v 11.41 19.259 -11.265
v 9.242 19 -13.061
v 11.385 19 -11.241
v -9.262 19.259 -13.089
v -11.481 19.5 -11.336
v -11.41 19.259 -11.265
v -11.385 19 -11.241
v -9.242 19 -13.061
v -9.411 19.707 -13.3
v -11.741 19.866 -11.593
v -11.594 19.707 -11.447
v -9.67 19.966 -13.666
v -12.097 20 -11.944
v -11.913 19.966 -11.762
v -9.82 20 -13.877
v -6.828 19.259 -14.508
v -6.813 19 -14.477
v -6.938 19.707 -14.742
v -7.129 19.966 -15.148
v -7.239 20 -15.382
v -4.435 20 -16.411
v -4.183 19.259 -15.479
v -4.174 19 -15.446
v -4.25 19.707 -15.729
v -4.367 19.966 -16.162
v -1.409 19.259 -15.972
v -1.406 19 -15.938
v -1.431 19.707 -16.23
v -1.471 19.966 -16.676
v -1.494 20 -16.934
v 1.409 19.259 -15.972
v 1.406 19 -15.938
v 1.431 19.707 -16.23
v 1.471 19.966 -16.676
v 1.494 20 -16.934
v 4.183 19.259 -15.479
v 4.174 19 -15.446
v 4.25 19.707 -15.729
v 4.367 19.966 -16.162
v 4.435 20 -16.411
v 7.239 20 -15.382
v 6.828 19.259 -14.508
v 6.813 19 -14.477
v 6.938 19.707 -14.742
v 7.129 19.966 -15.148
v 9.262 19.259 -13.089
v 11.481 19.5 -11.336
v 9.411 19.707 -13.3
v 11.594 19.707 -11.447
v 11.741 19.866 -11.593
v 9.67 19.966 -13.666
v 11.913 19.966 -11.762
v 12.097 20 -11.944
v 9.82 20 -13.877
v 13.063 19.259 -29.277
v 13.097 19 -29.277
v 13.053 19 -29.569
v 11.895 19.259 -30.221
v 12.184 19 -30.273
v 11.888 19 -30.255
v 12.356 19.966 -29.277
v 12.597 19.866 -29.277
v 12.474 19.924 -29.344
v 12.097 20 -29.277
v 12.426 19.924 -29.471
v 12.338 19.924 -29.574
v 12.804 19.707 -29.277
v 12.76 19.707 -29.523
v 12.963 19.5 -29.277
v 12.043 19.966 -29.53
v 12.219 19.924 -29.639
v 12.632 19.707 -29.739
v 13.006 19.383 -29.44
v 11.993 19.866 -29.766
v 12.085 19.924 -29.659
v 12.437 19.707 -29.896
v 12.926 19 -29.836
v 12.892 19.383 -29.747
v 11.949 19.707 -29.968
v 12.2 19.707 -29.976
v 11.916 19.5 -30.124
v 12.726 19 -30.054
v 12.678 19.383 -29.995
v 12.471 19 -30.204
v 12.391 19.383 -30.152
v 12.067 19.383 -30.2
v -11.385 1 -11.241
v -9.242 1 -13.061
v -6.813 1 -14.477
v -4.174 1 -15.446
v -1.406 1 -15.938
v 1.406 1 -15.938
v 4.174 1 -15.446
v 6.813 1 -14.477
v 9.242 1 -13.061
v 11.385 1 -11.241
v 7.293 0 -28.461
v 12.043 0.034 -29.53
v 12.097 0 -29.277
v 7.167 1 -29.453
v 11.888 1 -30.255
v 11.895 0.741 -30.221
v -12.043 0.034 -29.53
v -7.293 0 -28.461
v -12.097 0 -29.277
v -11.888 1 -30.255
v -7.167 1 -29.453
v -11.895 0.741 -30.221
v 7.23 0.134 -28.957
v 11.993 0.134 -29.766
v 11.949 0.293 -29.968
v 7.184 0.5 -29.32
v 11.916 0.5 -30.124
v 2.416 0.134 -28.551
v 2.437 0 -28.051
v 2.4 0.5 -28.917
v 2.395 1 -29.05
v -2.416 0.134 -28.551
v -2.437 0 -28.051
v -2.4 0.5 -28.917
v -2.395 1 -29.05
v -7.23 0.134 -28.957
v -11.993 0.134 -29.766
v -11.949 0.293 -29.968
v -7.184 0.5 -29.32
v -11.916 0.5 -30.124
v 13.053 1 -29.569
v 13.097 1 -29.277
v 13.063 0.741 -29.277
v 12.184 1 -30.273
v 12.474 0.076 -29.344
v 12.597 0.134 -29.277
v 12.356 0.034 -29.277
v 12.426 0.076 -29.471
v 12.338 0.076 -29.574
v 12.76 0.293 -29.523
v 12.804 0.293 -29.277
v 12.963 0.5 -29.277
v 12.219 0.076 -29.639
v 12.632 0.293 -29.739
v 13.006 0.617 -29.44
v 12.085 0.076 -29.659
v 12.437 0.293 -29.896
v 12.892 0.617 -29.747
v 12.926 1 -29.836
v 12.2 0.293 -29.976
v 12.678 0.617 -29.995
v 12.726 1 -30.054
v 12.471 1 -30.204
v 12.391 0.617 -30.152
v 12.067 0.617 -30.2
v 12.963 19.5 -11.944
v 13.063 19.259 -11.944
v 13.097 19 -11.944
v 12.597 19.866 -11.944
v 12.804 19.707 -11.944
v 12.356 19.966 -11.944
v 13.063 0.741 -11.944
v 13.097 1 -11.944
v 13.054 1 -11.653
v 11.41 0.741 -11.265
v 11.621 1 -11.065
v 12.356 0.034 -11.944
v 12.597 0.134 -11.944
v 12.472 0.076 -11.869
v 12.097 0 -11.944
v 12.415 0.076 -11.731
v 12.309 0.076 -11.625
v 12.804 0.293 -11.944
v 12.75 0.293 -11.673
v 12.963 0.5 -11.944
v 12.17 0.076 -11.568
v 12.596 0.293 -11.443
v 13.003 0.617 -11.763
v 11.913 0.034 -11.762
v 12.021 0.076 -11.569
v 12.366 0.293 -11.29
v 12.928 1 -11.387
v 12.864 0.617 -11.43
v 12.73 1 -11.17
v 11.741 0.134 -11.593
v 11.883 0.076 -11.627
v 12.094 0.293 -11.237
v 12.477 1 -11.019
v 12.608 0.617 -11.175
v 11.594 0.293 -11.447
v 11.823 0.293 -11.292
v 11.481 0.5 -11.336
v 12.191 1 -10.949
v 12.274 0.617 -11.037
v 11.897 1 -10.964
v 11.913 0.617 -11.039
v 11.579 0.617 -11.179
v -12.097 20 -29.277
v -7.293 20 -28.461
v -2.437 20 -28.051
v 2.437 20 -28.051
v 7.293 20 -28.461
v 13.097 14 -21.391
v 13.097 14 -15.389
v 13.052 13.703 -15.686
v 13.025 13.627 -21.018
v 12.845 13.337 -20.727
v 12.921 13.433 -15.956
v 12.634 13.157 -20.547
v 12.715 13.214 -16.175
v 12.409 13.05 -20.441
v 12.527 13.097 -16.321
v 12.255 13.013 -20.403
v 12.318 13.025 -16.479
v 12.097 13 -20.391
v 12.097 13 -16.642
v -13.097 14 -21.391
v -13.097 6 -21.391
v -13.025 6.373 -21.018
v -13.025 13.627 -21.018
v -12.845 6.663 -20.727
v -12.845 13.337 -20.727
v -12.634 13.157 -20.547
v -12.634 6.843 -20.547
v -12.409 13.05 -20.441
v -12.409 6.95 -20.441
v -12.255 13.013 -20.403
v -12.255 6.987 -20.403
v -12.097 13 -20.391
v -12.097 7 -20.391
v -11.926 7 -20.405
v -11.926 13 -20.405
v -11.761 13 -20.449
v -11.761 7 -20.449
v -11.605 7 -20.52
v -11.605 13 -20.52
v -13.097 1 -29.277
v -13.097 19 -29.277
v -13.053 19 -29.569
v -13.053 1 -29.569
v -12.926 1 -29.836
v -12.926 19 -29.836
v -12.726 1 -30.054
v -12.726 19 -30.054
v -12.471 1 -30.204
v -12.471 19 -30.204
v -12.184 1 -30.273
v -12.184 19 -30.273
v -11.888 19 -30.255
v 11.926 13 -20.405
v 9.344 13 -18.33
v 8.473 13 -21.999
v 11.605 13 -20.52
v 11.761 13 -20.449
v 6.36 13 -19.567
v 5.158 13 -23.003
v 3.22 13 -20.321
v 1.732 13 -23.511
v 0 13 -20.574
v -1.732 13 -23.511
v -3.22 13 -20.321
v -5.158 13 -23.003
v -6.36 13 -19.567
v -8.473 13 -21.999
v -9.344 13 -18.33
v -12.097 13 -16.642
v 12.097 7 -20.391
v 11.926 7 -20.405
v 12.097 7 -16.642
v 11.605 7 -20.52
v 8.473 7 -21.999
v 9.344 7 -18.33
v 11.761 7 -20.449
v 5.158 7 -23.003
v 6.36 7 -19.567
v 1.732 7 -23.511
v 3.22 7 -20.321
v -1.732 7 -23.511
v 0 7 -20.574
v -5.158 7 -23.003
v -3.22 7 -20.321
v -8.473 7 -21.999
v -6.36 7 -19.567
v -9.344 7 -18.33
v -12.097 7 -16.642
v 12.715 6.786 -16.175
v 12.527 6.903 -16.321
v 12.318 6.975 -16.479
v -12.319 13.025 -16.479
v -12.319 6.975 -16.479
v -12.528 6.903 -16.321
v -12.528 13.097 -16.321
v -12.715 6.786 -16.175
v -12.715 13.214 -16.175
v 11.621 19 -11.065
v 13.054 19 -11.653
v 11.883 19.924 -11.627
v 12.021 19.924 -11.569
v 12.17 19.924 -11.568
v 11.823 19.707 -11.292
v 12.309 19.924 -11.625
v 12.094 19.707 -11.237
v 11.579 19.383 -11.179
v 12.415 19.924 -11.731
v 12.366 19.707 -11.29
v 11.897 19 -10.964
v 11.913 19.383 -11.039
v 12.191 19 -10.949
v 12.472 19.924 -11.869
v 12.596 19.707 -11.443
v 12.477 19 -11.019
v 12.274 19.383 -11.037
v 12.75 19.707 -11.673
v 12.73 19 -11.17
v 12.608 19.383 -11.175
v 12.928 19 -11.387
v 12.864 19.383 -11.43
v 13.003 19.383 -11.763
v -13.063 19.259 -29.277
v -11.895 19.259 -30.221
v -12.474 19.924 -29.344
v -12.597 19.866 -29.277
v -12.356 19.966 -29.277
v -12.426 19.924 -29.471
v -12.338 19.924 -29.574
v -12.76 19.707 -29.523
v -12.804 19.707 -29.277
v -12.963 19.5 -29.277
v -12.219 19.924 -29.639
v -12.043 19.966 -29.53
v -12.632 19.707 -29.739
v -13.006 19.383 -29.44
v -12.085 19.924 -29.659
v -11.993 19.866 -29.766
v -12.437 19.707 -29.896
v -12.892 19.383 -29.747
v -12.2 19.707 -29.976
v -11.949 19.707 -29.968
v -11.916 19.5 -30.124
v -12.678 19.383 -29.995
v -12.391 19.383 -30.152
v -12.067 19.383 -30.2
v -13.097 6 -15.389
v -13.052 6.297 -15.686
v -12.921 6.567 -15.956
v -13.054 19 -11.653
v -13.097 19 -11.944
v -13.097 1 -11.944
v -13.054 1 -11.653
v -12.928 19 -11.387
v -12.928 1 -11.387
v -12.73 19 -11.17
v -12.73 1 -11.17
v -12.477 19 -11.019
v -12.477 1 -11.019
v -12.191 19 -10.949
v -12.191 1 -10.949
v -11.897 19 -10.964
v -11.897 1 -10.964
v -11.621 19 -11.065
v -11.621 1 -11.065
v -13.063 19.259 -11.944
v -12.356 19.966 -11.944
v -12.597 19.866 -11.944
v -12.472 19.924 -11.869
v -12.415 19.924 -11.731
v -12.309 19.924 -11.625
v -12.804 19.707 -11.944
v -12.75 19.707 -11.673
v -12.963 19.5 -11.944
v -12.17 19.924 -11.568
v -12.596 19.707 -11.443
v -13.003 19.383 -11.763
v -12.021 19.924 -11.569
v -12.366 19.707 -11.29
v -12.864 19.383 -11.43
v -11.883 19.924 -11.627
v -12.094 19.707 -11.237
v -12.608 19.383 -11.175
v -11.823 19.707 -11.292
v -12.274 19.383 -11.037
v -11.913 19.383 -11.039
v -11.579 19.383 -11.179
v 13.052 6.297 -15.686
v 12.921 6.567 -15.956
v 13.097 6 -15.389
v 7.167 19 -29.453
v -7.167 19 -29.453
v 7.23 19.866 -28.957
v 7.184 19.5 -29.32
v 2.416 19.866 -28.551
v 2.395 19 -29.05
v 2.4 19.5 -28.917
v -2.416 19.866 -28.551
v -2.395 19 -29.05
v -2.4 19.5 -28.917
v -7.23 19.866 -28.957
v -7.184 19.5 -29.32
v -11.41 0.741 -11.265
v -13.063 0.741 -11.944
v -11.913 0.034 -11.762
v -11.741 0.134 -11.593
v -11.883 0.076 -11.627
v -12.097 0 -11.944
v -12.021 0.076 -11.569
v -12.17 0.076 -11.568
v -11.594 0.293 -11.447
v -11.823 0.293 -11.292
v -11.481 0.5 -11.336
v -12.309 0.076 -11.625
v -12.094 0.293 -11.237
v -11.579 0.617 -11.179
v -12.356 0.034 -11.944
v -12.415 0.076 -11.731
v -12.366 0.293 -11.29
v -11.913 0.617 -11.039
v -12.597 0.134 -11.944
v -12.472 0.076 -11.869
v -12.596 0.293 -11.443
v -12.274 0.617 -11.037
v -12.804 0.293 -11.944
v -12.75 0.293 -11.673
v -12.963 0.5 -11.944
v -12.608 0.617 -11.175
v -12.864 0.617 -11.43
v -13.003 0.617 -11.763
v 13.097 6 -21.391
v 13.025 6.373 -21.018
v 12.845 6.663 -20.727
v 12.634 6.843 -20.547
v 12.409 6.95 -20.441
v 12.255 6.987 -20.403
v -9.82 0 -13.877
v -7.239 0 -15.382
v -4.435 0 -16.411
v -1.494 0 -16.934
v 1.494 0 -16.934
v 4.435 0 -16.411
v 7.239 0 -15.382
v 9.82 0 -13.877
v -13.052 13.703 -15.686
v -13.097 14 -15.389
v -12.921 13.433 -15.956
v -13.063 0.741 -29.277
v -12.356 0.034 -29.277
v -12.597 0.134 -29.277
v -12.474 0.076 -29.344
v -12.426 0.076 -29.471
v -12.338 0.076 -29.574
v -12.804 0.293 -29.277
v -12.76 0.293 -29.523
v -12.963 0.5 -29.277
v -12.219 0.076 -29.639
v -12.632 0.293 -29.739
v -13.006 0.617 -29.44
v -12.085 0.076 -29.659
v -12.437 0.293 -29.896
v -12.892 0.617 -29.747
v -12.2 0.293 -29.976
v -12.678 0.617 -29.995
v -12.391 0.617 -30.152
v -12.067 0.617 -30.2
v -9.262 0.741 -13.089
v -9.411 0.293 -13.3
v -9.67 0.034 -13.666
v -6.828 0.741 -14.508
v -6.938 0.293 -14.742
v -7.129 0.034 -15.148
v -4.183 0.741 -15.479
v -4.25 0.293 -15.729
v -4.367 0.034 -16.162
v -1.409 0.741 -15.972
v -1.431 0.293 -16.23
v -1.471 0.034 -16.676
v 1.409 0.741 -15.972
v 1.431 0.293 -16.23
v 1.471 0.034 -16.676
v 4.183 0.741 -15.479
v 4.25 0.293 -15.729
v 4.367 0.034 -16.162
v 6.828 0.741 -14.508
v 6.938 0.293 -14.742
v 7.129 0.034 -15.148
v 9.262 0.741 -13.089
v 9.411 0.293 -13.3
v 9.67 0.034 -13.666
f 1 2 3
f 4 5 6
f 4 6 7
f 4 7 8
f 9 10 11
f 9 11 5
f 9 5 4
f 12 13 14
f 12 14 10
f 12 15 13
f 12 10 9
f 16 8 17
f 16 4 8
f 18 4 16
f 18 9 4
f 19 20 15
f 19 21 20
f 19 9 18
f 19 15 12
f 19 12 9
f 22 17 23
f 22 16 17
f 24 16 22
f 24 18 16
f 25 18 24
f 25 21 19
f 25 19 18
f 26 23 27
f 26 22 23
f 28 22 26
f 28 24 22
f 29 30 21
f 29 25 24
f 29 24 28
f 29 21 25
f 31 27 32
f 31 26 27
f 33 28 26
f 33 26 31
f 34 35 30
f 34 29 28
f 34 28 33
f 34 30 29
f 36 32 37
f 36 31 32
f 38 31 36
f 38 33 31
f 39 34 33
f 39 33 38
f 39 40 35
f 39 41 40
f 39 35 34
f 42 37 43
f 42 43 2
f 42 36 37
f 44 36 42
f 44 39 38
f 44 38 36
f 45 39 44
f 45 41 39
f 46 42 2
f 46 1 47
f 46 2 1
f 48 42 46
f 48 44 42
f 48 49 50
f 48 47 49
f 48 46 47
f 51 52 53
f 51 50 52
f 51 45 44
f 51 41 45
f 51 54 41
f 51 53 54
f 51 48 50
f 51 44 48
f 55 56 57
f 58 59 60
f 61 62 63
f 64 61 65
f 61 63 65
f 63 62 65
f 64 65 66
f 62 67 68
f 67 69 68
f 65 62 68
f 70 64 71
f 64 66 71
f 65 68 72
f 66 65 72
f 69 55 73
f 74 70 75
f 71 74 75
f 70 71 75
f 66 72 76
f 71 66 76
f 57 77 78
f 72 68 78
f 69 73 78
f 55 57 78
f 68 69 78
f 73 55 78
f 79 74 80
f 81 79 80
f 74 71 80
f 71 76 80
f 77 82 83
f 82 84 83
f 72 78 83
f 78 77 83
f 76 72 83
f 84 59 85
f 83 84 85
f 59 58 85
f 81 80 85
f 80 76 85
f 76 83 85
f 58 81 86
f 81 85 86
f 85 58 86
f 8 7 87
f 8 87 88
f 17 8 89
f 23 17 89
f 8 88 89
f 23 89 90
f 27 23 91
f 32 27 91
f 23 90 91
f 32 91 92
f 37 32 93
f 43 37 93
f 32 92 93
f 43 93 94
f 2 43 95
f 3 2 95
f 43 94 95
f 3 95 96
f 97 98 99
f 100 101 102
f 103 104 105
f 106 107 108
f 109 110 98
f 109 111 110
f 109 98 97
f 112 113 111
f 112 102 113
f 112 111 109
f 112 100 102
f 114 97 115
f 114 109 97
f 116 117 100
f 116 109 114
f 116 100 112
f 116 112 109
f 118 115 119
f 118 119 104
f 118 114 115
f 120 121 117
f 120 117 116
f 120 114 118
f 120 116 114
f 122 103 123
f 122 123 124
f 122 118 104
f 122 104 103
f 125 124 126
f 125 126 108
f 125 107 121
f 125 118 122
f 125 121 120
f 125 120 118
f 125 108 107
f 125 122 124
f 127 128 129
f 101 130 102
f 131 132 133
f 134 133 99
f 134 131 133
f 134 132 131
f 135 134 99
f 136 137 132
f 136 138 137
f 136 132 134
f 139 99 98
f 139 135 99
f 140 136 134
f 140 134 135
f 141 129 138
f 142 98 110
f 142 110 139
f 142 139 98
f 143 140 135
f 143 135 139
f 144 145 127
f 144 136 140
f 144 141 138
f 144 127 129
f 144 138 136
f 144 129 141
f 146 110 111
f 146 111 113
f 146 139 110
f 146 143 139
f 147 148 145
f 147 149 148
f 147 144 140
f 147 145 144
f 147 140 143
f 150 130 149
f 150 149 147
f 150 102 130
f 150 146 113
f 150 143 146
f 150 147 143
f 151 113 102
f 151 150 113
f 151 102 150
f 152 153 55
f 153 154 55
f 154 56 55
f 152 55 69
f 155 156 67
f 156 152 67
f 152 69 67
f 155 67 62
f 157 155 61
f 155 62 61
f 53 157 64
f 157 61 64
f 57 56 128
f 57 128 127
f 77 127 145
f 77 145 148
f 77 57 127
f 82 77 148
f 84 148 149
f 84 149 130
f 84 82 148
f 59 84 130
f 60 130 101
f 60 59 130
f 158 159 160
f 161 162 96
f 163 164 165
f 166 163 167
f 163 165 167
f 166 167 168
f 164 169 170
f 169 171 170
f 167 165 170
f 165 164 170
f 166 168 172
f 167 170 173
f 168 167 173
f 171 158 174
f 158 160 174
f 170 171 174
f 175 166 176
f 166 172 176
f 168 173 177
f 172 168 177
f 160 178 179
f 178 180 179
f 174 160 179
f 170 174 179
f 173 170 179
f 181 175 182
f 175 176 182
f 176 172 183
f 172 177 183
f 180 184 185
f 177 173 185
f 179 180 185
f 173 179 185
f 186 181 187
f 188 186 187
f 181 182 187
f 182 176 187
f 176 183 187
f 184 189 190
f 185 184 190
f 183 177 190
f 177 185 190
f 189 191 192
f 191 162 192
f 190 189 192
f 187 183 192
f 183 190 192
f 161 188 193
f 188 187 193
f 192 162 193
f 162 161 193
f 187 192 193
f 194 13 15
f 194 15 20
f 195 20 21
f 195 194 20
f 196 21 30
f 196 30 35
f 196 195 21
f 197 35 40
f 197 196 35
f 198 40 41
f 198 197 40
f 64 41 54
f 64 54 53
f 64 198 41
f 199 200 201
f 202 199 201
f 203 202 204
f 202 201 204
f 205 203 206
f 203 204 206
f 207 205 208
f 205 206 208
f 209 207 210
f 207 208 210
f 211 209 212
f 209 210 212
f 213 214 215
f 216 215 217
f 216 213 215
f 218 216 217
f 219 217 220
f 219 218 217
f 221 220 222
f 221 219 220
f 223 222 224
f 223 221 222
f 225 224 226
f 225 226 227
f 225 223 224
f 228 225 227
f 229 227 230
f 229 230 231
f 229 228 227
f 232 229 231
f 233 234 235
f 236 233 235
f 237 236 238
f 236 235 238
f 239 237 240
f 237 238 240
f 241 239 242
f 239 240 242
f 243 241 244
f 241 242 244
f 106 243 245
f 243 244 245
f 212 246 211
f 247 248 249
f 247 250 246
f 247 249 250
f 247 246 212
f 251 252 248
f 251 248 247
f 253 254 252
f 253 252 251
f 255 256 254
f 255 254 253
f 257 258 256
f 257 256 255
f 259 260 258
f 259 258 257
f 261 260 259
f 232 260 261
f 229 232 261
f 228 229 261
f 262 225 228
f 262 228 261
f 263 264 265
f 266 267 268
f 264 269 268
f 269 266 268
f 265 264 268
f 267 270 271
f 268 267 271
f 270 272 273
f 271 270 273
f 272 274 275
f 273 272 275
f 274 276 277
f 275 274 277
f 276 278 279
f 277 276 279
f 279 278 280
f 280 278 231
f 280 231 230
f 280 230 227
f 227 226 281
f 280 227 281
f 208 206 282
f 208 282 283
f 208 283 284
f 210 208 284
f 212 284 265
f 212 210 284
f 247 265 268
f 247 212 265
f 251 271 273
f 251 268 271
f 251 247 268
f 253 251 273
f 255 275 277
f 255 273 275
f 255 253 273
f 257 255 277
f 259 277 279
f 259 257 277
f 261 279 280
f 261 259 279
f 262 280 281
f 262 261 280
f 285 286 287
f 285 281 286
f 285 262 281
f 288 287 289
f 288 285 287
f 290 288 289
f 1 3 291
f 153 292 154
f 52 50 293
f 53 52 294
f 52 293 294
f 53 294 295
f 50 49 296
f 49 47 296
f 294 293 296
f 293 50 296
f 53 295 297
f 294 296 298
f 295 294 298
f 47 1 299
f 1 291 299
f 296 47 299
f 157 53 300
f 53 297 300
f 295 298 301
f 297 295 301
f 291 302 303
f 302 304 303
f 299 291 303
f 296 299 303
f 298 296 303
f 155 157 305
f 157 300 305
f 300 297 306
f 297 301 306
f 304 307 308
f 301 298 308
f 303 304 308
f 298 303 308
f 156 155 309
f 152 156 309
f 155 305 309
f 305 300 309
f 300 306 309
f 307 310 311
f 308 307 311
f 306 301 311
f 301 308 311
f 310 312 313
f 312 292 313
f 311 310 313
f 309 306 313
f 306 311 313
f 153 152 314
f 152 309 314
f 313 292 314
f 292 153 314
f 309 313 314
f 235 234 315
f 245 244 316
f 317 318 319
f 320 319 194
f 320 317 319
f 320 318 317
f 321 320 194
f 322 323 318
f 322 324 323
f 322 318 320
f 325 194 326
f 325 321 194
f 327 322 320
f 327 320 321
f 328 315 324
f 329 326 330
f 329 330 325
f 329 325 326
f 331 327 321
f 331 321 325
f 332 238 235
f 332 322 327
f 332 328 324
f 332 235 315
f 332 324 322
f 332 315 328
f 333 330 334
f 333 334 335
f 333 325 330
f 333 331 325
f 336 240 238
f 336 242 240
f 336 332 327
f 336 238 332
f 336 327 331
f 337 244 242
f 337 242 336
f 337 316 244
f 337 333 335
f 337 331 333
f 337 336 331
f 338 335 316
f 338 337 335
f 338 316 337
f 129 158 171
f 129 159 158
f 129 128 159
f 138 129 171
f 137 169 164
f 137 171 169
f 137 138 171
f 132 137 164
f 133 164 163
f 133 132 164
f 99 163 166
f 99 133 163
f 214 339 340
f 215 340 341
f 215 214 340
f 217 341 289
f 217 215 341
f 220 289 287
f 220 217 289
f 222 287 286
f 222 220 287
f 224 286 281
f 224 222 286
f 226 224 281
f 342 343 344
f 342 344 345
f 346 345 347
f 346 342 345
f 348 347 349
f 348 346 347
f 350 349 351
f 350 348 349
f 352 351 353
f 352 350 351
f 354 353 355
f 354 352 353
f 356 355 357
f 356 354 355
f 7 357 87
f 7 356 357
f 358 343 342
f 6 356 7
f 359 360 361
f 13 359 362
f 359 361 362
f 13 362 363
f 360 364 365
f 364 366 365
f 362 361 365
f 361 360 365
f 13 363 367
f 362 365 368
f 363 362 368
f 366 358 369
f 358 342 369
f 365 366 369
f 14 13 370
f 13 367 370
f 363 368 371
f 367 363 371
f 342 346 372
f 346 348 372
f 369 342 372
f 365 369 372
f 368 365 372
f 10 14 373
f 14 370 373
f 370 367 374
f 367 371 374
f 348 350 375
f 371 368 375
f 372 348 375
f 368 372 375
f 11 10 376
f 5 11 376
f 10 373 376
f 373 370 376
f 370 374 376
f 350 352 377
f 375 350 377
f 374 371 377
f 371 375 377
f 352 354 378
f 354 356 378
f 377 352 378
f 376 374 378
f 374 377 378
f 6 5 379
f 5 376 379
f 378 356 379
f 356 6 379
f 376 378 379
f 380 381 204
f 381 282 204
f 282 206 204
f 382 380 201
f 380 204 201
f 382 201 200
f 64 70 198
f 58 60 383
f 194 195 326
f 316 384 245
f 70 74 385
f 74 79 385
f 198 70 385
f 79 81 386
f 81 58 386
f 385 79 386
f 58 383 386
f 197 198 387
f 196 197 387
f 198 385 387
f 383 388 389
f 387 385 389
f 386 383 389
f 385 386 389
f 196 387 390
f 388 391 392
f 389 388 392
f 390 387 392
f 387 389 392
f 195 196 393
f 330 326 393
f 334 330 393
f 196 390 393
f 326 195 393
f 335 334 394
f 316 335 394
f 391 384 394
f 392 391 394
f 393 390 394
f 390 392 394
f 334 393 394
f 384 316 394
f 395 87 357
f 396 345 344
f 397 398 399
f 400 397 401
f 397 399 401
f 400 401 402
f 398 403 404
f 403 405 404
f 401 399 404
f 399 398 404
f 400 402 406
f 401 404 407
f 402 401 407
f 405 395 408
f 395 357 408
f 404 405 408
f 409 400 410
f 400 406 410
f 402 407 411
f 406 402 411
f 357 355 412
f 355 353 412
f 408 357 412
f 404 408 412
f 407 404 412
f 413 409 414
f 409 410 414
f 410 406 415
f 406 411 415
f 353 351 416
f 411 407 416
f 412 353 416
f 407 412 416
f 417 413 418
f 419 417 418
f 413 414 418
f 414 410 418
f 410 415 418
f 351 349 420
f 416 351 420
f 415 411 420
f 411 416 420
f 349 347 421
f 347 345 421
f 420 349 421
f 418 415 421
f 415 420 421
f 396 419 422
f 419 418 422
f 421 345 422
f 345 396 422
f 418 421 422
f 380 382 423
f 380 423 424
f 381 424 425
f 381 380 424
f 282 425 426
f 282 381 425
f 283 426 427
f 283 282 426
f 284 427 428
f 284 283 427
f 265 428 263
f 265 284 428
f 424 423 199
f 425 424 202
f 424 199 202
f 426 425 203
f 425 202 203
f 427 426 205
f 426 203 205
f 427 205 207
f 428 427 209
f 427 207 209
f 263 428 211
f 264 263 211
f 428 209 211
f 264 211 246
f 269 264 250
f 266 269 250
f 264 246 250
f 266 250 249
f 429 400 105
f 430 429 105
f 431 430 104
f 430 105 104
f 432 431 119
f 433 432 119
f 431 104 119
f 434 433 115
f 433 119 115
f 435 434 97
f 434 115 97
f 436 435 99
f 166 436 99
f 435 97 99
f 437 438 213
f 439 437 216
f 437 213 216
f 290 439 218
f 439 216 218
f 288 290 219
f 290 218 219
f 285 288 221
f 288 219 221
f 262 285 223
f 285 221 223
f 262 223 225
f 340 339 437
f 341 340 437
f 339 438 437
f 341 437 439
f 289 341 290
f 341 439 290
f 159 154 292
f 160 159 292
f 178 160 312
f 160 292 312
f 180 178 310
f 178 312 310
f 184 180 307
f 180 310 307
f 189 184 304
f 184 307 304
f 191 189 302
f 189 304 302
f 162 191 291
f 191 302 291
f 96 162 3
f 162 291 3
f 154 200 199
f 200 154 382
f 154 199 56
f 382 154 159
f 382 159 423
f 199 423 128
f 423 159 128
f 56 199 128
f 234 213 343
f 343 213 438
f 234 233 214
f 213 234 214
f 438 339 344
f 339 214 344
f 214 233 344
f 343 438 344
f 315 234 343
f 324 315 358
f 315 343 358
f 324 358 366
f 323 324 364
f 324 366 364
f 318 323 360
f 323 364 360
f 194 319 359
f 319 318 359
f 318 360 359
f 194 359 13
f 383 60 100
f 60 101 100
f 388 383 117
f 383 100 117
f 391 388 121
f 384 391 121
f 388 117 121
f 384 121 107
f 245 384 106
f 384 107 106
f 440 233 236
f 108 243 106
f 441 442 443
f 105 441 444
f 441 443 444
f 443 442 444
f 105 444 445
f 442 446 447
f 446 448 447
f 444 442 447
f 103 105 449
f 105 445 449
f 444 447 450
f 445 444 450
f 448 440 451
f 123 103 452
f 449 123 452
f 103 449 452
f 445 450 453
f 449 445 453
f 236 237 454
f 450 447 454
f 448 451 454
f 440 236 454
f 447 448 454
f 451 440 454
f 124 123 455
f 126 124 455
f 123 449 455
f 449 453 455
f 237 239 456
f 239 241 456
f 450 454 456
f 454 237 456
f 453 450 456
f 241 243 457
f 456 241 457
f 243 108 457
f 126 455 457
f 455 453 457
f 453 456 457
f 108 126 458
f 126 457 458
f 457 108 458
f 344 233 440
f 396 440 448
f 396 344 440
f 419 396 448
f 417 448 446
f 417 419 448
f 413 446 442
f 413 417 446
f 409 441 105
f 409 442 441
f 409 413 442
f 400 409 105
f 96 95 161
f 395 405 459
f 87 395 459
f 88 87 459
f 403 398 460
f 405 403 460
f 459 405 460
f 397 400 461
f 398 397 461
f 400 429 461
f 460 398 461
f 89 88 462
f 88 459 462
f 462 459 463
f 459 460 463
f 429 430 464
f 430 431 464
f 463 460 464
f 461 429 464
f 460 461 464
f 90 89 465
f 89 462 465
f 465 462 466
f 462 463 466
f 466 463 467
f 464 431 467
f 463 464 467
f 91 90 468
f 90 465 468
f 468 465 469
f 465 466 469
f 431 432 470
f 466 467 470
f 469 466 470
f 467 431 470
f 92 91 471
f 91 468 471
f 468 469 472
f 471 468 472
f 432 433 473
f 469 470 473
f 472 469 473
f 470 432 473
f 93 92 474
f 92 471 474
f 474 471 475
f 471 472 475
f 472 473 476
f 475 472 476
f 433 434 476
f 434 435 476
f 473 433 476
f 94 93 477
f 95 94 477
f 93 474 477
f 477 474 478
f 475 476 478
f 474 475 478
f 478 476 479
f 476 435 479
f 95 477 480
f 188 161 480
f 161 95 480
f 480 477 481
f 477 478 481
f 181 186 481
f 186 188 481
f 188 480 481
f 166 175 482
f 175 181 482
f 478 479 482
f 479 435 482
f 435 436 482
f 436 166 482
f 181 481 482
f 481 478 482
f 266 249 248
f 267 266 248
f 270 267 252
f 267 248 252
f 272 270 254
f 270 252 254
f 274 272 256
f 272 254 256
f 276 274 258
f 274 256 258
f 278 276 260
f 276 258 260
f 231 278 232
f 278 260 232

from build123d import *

# Parameters (mm, degrees)
BOSS_EXTRUDE1_DEPTH = 20
SKETCH2_W           = 3
SKETCH2_H           = 6
FILLET1_R           = 1


with BuildPart() as part:
    # Sketch1 → Boss-Extrude1 (new body)
    with BuildSketch(Plane(origin=(0, 0, 0), x_dir=(1, 0, 0), z_dir=(0, 1, 0))):
        with BuildLine():
            Line((-13.097063825, 30.526339541), (-13.097063825, 9.190588619))
            ThreePointArc((-13.097063825, 9.190588619), (0, 16), (13.097063825, 9.190588619))
            Line((13.097063825, 9.190588619), (13.097063825, 30.526339541))
            ThreePointArc((13.097063825, 30.526339541), (0, 29), (-13.097063825, 30.526339541))
        make_face()
    extrude(amount=BOSS_EXTRUDE1_DEPTH)

    # Sketch2 → Cut-Revolve1 (revolve, cut)
    with BuildSketch(Plane(origin=(0, 0, 0), x_dir=(0, 0, -1), z_dir=(1, 0, 0))):
        with Locations((22.074416819, 10)):
            Rectangle(SKETCH2_W, SKETCH2_H)
    revolve(axis=Axis((0, 0, 0), (0, 1, 0)), mode=Mode.SUBTRACT)

    # Fillet1
    fillet1_edges = [part.edges().sort_by_distance(p)[0] for p in [
        (0, 20, -16),
        (13.097063825, 13, -17.734452708),
        (13.097063825, 10, -19.601531765),
        (13.097063825, 7, -17.734452708),
        (13.097063825, 10, -15.867373652),
        (13.097063825, 20, -19.85846408),
        (-13.097063825, 10, -15.867373652),
        (-13.097063825, 7, -17.734452708),
        (-13.097063825, 10, -19.601531765),
        (-13.097063825, 13, -17.734452708),
        (0, 20, -29),
        (13.097063825, 0, -19.85846408),
        (0, 0, -16),
        (-13.097063825, 0, -19.85846408),
        (0, 0, -29),
        (13.097063825, 10, -30.526339541),
        (13.097063825, 10, -9.190588619),
        (-13.097063825, 10, -9.190588619),
        (-13.097063825, 10, -30.526339541),
        (-13.097063825, 20, -19.85846408),
    ]]
    fillet(fillet1_edges, radius=FILLET1_R)


solid = part.part
